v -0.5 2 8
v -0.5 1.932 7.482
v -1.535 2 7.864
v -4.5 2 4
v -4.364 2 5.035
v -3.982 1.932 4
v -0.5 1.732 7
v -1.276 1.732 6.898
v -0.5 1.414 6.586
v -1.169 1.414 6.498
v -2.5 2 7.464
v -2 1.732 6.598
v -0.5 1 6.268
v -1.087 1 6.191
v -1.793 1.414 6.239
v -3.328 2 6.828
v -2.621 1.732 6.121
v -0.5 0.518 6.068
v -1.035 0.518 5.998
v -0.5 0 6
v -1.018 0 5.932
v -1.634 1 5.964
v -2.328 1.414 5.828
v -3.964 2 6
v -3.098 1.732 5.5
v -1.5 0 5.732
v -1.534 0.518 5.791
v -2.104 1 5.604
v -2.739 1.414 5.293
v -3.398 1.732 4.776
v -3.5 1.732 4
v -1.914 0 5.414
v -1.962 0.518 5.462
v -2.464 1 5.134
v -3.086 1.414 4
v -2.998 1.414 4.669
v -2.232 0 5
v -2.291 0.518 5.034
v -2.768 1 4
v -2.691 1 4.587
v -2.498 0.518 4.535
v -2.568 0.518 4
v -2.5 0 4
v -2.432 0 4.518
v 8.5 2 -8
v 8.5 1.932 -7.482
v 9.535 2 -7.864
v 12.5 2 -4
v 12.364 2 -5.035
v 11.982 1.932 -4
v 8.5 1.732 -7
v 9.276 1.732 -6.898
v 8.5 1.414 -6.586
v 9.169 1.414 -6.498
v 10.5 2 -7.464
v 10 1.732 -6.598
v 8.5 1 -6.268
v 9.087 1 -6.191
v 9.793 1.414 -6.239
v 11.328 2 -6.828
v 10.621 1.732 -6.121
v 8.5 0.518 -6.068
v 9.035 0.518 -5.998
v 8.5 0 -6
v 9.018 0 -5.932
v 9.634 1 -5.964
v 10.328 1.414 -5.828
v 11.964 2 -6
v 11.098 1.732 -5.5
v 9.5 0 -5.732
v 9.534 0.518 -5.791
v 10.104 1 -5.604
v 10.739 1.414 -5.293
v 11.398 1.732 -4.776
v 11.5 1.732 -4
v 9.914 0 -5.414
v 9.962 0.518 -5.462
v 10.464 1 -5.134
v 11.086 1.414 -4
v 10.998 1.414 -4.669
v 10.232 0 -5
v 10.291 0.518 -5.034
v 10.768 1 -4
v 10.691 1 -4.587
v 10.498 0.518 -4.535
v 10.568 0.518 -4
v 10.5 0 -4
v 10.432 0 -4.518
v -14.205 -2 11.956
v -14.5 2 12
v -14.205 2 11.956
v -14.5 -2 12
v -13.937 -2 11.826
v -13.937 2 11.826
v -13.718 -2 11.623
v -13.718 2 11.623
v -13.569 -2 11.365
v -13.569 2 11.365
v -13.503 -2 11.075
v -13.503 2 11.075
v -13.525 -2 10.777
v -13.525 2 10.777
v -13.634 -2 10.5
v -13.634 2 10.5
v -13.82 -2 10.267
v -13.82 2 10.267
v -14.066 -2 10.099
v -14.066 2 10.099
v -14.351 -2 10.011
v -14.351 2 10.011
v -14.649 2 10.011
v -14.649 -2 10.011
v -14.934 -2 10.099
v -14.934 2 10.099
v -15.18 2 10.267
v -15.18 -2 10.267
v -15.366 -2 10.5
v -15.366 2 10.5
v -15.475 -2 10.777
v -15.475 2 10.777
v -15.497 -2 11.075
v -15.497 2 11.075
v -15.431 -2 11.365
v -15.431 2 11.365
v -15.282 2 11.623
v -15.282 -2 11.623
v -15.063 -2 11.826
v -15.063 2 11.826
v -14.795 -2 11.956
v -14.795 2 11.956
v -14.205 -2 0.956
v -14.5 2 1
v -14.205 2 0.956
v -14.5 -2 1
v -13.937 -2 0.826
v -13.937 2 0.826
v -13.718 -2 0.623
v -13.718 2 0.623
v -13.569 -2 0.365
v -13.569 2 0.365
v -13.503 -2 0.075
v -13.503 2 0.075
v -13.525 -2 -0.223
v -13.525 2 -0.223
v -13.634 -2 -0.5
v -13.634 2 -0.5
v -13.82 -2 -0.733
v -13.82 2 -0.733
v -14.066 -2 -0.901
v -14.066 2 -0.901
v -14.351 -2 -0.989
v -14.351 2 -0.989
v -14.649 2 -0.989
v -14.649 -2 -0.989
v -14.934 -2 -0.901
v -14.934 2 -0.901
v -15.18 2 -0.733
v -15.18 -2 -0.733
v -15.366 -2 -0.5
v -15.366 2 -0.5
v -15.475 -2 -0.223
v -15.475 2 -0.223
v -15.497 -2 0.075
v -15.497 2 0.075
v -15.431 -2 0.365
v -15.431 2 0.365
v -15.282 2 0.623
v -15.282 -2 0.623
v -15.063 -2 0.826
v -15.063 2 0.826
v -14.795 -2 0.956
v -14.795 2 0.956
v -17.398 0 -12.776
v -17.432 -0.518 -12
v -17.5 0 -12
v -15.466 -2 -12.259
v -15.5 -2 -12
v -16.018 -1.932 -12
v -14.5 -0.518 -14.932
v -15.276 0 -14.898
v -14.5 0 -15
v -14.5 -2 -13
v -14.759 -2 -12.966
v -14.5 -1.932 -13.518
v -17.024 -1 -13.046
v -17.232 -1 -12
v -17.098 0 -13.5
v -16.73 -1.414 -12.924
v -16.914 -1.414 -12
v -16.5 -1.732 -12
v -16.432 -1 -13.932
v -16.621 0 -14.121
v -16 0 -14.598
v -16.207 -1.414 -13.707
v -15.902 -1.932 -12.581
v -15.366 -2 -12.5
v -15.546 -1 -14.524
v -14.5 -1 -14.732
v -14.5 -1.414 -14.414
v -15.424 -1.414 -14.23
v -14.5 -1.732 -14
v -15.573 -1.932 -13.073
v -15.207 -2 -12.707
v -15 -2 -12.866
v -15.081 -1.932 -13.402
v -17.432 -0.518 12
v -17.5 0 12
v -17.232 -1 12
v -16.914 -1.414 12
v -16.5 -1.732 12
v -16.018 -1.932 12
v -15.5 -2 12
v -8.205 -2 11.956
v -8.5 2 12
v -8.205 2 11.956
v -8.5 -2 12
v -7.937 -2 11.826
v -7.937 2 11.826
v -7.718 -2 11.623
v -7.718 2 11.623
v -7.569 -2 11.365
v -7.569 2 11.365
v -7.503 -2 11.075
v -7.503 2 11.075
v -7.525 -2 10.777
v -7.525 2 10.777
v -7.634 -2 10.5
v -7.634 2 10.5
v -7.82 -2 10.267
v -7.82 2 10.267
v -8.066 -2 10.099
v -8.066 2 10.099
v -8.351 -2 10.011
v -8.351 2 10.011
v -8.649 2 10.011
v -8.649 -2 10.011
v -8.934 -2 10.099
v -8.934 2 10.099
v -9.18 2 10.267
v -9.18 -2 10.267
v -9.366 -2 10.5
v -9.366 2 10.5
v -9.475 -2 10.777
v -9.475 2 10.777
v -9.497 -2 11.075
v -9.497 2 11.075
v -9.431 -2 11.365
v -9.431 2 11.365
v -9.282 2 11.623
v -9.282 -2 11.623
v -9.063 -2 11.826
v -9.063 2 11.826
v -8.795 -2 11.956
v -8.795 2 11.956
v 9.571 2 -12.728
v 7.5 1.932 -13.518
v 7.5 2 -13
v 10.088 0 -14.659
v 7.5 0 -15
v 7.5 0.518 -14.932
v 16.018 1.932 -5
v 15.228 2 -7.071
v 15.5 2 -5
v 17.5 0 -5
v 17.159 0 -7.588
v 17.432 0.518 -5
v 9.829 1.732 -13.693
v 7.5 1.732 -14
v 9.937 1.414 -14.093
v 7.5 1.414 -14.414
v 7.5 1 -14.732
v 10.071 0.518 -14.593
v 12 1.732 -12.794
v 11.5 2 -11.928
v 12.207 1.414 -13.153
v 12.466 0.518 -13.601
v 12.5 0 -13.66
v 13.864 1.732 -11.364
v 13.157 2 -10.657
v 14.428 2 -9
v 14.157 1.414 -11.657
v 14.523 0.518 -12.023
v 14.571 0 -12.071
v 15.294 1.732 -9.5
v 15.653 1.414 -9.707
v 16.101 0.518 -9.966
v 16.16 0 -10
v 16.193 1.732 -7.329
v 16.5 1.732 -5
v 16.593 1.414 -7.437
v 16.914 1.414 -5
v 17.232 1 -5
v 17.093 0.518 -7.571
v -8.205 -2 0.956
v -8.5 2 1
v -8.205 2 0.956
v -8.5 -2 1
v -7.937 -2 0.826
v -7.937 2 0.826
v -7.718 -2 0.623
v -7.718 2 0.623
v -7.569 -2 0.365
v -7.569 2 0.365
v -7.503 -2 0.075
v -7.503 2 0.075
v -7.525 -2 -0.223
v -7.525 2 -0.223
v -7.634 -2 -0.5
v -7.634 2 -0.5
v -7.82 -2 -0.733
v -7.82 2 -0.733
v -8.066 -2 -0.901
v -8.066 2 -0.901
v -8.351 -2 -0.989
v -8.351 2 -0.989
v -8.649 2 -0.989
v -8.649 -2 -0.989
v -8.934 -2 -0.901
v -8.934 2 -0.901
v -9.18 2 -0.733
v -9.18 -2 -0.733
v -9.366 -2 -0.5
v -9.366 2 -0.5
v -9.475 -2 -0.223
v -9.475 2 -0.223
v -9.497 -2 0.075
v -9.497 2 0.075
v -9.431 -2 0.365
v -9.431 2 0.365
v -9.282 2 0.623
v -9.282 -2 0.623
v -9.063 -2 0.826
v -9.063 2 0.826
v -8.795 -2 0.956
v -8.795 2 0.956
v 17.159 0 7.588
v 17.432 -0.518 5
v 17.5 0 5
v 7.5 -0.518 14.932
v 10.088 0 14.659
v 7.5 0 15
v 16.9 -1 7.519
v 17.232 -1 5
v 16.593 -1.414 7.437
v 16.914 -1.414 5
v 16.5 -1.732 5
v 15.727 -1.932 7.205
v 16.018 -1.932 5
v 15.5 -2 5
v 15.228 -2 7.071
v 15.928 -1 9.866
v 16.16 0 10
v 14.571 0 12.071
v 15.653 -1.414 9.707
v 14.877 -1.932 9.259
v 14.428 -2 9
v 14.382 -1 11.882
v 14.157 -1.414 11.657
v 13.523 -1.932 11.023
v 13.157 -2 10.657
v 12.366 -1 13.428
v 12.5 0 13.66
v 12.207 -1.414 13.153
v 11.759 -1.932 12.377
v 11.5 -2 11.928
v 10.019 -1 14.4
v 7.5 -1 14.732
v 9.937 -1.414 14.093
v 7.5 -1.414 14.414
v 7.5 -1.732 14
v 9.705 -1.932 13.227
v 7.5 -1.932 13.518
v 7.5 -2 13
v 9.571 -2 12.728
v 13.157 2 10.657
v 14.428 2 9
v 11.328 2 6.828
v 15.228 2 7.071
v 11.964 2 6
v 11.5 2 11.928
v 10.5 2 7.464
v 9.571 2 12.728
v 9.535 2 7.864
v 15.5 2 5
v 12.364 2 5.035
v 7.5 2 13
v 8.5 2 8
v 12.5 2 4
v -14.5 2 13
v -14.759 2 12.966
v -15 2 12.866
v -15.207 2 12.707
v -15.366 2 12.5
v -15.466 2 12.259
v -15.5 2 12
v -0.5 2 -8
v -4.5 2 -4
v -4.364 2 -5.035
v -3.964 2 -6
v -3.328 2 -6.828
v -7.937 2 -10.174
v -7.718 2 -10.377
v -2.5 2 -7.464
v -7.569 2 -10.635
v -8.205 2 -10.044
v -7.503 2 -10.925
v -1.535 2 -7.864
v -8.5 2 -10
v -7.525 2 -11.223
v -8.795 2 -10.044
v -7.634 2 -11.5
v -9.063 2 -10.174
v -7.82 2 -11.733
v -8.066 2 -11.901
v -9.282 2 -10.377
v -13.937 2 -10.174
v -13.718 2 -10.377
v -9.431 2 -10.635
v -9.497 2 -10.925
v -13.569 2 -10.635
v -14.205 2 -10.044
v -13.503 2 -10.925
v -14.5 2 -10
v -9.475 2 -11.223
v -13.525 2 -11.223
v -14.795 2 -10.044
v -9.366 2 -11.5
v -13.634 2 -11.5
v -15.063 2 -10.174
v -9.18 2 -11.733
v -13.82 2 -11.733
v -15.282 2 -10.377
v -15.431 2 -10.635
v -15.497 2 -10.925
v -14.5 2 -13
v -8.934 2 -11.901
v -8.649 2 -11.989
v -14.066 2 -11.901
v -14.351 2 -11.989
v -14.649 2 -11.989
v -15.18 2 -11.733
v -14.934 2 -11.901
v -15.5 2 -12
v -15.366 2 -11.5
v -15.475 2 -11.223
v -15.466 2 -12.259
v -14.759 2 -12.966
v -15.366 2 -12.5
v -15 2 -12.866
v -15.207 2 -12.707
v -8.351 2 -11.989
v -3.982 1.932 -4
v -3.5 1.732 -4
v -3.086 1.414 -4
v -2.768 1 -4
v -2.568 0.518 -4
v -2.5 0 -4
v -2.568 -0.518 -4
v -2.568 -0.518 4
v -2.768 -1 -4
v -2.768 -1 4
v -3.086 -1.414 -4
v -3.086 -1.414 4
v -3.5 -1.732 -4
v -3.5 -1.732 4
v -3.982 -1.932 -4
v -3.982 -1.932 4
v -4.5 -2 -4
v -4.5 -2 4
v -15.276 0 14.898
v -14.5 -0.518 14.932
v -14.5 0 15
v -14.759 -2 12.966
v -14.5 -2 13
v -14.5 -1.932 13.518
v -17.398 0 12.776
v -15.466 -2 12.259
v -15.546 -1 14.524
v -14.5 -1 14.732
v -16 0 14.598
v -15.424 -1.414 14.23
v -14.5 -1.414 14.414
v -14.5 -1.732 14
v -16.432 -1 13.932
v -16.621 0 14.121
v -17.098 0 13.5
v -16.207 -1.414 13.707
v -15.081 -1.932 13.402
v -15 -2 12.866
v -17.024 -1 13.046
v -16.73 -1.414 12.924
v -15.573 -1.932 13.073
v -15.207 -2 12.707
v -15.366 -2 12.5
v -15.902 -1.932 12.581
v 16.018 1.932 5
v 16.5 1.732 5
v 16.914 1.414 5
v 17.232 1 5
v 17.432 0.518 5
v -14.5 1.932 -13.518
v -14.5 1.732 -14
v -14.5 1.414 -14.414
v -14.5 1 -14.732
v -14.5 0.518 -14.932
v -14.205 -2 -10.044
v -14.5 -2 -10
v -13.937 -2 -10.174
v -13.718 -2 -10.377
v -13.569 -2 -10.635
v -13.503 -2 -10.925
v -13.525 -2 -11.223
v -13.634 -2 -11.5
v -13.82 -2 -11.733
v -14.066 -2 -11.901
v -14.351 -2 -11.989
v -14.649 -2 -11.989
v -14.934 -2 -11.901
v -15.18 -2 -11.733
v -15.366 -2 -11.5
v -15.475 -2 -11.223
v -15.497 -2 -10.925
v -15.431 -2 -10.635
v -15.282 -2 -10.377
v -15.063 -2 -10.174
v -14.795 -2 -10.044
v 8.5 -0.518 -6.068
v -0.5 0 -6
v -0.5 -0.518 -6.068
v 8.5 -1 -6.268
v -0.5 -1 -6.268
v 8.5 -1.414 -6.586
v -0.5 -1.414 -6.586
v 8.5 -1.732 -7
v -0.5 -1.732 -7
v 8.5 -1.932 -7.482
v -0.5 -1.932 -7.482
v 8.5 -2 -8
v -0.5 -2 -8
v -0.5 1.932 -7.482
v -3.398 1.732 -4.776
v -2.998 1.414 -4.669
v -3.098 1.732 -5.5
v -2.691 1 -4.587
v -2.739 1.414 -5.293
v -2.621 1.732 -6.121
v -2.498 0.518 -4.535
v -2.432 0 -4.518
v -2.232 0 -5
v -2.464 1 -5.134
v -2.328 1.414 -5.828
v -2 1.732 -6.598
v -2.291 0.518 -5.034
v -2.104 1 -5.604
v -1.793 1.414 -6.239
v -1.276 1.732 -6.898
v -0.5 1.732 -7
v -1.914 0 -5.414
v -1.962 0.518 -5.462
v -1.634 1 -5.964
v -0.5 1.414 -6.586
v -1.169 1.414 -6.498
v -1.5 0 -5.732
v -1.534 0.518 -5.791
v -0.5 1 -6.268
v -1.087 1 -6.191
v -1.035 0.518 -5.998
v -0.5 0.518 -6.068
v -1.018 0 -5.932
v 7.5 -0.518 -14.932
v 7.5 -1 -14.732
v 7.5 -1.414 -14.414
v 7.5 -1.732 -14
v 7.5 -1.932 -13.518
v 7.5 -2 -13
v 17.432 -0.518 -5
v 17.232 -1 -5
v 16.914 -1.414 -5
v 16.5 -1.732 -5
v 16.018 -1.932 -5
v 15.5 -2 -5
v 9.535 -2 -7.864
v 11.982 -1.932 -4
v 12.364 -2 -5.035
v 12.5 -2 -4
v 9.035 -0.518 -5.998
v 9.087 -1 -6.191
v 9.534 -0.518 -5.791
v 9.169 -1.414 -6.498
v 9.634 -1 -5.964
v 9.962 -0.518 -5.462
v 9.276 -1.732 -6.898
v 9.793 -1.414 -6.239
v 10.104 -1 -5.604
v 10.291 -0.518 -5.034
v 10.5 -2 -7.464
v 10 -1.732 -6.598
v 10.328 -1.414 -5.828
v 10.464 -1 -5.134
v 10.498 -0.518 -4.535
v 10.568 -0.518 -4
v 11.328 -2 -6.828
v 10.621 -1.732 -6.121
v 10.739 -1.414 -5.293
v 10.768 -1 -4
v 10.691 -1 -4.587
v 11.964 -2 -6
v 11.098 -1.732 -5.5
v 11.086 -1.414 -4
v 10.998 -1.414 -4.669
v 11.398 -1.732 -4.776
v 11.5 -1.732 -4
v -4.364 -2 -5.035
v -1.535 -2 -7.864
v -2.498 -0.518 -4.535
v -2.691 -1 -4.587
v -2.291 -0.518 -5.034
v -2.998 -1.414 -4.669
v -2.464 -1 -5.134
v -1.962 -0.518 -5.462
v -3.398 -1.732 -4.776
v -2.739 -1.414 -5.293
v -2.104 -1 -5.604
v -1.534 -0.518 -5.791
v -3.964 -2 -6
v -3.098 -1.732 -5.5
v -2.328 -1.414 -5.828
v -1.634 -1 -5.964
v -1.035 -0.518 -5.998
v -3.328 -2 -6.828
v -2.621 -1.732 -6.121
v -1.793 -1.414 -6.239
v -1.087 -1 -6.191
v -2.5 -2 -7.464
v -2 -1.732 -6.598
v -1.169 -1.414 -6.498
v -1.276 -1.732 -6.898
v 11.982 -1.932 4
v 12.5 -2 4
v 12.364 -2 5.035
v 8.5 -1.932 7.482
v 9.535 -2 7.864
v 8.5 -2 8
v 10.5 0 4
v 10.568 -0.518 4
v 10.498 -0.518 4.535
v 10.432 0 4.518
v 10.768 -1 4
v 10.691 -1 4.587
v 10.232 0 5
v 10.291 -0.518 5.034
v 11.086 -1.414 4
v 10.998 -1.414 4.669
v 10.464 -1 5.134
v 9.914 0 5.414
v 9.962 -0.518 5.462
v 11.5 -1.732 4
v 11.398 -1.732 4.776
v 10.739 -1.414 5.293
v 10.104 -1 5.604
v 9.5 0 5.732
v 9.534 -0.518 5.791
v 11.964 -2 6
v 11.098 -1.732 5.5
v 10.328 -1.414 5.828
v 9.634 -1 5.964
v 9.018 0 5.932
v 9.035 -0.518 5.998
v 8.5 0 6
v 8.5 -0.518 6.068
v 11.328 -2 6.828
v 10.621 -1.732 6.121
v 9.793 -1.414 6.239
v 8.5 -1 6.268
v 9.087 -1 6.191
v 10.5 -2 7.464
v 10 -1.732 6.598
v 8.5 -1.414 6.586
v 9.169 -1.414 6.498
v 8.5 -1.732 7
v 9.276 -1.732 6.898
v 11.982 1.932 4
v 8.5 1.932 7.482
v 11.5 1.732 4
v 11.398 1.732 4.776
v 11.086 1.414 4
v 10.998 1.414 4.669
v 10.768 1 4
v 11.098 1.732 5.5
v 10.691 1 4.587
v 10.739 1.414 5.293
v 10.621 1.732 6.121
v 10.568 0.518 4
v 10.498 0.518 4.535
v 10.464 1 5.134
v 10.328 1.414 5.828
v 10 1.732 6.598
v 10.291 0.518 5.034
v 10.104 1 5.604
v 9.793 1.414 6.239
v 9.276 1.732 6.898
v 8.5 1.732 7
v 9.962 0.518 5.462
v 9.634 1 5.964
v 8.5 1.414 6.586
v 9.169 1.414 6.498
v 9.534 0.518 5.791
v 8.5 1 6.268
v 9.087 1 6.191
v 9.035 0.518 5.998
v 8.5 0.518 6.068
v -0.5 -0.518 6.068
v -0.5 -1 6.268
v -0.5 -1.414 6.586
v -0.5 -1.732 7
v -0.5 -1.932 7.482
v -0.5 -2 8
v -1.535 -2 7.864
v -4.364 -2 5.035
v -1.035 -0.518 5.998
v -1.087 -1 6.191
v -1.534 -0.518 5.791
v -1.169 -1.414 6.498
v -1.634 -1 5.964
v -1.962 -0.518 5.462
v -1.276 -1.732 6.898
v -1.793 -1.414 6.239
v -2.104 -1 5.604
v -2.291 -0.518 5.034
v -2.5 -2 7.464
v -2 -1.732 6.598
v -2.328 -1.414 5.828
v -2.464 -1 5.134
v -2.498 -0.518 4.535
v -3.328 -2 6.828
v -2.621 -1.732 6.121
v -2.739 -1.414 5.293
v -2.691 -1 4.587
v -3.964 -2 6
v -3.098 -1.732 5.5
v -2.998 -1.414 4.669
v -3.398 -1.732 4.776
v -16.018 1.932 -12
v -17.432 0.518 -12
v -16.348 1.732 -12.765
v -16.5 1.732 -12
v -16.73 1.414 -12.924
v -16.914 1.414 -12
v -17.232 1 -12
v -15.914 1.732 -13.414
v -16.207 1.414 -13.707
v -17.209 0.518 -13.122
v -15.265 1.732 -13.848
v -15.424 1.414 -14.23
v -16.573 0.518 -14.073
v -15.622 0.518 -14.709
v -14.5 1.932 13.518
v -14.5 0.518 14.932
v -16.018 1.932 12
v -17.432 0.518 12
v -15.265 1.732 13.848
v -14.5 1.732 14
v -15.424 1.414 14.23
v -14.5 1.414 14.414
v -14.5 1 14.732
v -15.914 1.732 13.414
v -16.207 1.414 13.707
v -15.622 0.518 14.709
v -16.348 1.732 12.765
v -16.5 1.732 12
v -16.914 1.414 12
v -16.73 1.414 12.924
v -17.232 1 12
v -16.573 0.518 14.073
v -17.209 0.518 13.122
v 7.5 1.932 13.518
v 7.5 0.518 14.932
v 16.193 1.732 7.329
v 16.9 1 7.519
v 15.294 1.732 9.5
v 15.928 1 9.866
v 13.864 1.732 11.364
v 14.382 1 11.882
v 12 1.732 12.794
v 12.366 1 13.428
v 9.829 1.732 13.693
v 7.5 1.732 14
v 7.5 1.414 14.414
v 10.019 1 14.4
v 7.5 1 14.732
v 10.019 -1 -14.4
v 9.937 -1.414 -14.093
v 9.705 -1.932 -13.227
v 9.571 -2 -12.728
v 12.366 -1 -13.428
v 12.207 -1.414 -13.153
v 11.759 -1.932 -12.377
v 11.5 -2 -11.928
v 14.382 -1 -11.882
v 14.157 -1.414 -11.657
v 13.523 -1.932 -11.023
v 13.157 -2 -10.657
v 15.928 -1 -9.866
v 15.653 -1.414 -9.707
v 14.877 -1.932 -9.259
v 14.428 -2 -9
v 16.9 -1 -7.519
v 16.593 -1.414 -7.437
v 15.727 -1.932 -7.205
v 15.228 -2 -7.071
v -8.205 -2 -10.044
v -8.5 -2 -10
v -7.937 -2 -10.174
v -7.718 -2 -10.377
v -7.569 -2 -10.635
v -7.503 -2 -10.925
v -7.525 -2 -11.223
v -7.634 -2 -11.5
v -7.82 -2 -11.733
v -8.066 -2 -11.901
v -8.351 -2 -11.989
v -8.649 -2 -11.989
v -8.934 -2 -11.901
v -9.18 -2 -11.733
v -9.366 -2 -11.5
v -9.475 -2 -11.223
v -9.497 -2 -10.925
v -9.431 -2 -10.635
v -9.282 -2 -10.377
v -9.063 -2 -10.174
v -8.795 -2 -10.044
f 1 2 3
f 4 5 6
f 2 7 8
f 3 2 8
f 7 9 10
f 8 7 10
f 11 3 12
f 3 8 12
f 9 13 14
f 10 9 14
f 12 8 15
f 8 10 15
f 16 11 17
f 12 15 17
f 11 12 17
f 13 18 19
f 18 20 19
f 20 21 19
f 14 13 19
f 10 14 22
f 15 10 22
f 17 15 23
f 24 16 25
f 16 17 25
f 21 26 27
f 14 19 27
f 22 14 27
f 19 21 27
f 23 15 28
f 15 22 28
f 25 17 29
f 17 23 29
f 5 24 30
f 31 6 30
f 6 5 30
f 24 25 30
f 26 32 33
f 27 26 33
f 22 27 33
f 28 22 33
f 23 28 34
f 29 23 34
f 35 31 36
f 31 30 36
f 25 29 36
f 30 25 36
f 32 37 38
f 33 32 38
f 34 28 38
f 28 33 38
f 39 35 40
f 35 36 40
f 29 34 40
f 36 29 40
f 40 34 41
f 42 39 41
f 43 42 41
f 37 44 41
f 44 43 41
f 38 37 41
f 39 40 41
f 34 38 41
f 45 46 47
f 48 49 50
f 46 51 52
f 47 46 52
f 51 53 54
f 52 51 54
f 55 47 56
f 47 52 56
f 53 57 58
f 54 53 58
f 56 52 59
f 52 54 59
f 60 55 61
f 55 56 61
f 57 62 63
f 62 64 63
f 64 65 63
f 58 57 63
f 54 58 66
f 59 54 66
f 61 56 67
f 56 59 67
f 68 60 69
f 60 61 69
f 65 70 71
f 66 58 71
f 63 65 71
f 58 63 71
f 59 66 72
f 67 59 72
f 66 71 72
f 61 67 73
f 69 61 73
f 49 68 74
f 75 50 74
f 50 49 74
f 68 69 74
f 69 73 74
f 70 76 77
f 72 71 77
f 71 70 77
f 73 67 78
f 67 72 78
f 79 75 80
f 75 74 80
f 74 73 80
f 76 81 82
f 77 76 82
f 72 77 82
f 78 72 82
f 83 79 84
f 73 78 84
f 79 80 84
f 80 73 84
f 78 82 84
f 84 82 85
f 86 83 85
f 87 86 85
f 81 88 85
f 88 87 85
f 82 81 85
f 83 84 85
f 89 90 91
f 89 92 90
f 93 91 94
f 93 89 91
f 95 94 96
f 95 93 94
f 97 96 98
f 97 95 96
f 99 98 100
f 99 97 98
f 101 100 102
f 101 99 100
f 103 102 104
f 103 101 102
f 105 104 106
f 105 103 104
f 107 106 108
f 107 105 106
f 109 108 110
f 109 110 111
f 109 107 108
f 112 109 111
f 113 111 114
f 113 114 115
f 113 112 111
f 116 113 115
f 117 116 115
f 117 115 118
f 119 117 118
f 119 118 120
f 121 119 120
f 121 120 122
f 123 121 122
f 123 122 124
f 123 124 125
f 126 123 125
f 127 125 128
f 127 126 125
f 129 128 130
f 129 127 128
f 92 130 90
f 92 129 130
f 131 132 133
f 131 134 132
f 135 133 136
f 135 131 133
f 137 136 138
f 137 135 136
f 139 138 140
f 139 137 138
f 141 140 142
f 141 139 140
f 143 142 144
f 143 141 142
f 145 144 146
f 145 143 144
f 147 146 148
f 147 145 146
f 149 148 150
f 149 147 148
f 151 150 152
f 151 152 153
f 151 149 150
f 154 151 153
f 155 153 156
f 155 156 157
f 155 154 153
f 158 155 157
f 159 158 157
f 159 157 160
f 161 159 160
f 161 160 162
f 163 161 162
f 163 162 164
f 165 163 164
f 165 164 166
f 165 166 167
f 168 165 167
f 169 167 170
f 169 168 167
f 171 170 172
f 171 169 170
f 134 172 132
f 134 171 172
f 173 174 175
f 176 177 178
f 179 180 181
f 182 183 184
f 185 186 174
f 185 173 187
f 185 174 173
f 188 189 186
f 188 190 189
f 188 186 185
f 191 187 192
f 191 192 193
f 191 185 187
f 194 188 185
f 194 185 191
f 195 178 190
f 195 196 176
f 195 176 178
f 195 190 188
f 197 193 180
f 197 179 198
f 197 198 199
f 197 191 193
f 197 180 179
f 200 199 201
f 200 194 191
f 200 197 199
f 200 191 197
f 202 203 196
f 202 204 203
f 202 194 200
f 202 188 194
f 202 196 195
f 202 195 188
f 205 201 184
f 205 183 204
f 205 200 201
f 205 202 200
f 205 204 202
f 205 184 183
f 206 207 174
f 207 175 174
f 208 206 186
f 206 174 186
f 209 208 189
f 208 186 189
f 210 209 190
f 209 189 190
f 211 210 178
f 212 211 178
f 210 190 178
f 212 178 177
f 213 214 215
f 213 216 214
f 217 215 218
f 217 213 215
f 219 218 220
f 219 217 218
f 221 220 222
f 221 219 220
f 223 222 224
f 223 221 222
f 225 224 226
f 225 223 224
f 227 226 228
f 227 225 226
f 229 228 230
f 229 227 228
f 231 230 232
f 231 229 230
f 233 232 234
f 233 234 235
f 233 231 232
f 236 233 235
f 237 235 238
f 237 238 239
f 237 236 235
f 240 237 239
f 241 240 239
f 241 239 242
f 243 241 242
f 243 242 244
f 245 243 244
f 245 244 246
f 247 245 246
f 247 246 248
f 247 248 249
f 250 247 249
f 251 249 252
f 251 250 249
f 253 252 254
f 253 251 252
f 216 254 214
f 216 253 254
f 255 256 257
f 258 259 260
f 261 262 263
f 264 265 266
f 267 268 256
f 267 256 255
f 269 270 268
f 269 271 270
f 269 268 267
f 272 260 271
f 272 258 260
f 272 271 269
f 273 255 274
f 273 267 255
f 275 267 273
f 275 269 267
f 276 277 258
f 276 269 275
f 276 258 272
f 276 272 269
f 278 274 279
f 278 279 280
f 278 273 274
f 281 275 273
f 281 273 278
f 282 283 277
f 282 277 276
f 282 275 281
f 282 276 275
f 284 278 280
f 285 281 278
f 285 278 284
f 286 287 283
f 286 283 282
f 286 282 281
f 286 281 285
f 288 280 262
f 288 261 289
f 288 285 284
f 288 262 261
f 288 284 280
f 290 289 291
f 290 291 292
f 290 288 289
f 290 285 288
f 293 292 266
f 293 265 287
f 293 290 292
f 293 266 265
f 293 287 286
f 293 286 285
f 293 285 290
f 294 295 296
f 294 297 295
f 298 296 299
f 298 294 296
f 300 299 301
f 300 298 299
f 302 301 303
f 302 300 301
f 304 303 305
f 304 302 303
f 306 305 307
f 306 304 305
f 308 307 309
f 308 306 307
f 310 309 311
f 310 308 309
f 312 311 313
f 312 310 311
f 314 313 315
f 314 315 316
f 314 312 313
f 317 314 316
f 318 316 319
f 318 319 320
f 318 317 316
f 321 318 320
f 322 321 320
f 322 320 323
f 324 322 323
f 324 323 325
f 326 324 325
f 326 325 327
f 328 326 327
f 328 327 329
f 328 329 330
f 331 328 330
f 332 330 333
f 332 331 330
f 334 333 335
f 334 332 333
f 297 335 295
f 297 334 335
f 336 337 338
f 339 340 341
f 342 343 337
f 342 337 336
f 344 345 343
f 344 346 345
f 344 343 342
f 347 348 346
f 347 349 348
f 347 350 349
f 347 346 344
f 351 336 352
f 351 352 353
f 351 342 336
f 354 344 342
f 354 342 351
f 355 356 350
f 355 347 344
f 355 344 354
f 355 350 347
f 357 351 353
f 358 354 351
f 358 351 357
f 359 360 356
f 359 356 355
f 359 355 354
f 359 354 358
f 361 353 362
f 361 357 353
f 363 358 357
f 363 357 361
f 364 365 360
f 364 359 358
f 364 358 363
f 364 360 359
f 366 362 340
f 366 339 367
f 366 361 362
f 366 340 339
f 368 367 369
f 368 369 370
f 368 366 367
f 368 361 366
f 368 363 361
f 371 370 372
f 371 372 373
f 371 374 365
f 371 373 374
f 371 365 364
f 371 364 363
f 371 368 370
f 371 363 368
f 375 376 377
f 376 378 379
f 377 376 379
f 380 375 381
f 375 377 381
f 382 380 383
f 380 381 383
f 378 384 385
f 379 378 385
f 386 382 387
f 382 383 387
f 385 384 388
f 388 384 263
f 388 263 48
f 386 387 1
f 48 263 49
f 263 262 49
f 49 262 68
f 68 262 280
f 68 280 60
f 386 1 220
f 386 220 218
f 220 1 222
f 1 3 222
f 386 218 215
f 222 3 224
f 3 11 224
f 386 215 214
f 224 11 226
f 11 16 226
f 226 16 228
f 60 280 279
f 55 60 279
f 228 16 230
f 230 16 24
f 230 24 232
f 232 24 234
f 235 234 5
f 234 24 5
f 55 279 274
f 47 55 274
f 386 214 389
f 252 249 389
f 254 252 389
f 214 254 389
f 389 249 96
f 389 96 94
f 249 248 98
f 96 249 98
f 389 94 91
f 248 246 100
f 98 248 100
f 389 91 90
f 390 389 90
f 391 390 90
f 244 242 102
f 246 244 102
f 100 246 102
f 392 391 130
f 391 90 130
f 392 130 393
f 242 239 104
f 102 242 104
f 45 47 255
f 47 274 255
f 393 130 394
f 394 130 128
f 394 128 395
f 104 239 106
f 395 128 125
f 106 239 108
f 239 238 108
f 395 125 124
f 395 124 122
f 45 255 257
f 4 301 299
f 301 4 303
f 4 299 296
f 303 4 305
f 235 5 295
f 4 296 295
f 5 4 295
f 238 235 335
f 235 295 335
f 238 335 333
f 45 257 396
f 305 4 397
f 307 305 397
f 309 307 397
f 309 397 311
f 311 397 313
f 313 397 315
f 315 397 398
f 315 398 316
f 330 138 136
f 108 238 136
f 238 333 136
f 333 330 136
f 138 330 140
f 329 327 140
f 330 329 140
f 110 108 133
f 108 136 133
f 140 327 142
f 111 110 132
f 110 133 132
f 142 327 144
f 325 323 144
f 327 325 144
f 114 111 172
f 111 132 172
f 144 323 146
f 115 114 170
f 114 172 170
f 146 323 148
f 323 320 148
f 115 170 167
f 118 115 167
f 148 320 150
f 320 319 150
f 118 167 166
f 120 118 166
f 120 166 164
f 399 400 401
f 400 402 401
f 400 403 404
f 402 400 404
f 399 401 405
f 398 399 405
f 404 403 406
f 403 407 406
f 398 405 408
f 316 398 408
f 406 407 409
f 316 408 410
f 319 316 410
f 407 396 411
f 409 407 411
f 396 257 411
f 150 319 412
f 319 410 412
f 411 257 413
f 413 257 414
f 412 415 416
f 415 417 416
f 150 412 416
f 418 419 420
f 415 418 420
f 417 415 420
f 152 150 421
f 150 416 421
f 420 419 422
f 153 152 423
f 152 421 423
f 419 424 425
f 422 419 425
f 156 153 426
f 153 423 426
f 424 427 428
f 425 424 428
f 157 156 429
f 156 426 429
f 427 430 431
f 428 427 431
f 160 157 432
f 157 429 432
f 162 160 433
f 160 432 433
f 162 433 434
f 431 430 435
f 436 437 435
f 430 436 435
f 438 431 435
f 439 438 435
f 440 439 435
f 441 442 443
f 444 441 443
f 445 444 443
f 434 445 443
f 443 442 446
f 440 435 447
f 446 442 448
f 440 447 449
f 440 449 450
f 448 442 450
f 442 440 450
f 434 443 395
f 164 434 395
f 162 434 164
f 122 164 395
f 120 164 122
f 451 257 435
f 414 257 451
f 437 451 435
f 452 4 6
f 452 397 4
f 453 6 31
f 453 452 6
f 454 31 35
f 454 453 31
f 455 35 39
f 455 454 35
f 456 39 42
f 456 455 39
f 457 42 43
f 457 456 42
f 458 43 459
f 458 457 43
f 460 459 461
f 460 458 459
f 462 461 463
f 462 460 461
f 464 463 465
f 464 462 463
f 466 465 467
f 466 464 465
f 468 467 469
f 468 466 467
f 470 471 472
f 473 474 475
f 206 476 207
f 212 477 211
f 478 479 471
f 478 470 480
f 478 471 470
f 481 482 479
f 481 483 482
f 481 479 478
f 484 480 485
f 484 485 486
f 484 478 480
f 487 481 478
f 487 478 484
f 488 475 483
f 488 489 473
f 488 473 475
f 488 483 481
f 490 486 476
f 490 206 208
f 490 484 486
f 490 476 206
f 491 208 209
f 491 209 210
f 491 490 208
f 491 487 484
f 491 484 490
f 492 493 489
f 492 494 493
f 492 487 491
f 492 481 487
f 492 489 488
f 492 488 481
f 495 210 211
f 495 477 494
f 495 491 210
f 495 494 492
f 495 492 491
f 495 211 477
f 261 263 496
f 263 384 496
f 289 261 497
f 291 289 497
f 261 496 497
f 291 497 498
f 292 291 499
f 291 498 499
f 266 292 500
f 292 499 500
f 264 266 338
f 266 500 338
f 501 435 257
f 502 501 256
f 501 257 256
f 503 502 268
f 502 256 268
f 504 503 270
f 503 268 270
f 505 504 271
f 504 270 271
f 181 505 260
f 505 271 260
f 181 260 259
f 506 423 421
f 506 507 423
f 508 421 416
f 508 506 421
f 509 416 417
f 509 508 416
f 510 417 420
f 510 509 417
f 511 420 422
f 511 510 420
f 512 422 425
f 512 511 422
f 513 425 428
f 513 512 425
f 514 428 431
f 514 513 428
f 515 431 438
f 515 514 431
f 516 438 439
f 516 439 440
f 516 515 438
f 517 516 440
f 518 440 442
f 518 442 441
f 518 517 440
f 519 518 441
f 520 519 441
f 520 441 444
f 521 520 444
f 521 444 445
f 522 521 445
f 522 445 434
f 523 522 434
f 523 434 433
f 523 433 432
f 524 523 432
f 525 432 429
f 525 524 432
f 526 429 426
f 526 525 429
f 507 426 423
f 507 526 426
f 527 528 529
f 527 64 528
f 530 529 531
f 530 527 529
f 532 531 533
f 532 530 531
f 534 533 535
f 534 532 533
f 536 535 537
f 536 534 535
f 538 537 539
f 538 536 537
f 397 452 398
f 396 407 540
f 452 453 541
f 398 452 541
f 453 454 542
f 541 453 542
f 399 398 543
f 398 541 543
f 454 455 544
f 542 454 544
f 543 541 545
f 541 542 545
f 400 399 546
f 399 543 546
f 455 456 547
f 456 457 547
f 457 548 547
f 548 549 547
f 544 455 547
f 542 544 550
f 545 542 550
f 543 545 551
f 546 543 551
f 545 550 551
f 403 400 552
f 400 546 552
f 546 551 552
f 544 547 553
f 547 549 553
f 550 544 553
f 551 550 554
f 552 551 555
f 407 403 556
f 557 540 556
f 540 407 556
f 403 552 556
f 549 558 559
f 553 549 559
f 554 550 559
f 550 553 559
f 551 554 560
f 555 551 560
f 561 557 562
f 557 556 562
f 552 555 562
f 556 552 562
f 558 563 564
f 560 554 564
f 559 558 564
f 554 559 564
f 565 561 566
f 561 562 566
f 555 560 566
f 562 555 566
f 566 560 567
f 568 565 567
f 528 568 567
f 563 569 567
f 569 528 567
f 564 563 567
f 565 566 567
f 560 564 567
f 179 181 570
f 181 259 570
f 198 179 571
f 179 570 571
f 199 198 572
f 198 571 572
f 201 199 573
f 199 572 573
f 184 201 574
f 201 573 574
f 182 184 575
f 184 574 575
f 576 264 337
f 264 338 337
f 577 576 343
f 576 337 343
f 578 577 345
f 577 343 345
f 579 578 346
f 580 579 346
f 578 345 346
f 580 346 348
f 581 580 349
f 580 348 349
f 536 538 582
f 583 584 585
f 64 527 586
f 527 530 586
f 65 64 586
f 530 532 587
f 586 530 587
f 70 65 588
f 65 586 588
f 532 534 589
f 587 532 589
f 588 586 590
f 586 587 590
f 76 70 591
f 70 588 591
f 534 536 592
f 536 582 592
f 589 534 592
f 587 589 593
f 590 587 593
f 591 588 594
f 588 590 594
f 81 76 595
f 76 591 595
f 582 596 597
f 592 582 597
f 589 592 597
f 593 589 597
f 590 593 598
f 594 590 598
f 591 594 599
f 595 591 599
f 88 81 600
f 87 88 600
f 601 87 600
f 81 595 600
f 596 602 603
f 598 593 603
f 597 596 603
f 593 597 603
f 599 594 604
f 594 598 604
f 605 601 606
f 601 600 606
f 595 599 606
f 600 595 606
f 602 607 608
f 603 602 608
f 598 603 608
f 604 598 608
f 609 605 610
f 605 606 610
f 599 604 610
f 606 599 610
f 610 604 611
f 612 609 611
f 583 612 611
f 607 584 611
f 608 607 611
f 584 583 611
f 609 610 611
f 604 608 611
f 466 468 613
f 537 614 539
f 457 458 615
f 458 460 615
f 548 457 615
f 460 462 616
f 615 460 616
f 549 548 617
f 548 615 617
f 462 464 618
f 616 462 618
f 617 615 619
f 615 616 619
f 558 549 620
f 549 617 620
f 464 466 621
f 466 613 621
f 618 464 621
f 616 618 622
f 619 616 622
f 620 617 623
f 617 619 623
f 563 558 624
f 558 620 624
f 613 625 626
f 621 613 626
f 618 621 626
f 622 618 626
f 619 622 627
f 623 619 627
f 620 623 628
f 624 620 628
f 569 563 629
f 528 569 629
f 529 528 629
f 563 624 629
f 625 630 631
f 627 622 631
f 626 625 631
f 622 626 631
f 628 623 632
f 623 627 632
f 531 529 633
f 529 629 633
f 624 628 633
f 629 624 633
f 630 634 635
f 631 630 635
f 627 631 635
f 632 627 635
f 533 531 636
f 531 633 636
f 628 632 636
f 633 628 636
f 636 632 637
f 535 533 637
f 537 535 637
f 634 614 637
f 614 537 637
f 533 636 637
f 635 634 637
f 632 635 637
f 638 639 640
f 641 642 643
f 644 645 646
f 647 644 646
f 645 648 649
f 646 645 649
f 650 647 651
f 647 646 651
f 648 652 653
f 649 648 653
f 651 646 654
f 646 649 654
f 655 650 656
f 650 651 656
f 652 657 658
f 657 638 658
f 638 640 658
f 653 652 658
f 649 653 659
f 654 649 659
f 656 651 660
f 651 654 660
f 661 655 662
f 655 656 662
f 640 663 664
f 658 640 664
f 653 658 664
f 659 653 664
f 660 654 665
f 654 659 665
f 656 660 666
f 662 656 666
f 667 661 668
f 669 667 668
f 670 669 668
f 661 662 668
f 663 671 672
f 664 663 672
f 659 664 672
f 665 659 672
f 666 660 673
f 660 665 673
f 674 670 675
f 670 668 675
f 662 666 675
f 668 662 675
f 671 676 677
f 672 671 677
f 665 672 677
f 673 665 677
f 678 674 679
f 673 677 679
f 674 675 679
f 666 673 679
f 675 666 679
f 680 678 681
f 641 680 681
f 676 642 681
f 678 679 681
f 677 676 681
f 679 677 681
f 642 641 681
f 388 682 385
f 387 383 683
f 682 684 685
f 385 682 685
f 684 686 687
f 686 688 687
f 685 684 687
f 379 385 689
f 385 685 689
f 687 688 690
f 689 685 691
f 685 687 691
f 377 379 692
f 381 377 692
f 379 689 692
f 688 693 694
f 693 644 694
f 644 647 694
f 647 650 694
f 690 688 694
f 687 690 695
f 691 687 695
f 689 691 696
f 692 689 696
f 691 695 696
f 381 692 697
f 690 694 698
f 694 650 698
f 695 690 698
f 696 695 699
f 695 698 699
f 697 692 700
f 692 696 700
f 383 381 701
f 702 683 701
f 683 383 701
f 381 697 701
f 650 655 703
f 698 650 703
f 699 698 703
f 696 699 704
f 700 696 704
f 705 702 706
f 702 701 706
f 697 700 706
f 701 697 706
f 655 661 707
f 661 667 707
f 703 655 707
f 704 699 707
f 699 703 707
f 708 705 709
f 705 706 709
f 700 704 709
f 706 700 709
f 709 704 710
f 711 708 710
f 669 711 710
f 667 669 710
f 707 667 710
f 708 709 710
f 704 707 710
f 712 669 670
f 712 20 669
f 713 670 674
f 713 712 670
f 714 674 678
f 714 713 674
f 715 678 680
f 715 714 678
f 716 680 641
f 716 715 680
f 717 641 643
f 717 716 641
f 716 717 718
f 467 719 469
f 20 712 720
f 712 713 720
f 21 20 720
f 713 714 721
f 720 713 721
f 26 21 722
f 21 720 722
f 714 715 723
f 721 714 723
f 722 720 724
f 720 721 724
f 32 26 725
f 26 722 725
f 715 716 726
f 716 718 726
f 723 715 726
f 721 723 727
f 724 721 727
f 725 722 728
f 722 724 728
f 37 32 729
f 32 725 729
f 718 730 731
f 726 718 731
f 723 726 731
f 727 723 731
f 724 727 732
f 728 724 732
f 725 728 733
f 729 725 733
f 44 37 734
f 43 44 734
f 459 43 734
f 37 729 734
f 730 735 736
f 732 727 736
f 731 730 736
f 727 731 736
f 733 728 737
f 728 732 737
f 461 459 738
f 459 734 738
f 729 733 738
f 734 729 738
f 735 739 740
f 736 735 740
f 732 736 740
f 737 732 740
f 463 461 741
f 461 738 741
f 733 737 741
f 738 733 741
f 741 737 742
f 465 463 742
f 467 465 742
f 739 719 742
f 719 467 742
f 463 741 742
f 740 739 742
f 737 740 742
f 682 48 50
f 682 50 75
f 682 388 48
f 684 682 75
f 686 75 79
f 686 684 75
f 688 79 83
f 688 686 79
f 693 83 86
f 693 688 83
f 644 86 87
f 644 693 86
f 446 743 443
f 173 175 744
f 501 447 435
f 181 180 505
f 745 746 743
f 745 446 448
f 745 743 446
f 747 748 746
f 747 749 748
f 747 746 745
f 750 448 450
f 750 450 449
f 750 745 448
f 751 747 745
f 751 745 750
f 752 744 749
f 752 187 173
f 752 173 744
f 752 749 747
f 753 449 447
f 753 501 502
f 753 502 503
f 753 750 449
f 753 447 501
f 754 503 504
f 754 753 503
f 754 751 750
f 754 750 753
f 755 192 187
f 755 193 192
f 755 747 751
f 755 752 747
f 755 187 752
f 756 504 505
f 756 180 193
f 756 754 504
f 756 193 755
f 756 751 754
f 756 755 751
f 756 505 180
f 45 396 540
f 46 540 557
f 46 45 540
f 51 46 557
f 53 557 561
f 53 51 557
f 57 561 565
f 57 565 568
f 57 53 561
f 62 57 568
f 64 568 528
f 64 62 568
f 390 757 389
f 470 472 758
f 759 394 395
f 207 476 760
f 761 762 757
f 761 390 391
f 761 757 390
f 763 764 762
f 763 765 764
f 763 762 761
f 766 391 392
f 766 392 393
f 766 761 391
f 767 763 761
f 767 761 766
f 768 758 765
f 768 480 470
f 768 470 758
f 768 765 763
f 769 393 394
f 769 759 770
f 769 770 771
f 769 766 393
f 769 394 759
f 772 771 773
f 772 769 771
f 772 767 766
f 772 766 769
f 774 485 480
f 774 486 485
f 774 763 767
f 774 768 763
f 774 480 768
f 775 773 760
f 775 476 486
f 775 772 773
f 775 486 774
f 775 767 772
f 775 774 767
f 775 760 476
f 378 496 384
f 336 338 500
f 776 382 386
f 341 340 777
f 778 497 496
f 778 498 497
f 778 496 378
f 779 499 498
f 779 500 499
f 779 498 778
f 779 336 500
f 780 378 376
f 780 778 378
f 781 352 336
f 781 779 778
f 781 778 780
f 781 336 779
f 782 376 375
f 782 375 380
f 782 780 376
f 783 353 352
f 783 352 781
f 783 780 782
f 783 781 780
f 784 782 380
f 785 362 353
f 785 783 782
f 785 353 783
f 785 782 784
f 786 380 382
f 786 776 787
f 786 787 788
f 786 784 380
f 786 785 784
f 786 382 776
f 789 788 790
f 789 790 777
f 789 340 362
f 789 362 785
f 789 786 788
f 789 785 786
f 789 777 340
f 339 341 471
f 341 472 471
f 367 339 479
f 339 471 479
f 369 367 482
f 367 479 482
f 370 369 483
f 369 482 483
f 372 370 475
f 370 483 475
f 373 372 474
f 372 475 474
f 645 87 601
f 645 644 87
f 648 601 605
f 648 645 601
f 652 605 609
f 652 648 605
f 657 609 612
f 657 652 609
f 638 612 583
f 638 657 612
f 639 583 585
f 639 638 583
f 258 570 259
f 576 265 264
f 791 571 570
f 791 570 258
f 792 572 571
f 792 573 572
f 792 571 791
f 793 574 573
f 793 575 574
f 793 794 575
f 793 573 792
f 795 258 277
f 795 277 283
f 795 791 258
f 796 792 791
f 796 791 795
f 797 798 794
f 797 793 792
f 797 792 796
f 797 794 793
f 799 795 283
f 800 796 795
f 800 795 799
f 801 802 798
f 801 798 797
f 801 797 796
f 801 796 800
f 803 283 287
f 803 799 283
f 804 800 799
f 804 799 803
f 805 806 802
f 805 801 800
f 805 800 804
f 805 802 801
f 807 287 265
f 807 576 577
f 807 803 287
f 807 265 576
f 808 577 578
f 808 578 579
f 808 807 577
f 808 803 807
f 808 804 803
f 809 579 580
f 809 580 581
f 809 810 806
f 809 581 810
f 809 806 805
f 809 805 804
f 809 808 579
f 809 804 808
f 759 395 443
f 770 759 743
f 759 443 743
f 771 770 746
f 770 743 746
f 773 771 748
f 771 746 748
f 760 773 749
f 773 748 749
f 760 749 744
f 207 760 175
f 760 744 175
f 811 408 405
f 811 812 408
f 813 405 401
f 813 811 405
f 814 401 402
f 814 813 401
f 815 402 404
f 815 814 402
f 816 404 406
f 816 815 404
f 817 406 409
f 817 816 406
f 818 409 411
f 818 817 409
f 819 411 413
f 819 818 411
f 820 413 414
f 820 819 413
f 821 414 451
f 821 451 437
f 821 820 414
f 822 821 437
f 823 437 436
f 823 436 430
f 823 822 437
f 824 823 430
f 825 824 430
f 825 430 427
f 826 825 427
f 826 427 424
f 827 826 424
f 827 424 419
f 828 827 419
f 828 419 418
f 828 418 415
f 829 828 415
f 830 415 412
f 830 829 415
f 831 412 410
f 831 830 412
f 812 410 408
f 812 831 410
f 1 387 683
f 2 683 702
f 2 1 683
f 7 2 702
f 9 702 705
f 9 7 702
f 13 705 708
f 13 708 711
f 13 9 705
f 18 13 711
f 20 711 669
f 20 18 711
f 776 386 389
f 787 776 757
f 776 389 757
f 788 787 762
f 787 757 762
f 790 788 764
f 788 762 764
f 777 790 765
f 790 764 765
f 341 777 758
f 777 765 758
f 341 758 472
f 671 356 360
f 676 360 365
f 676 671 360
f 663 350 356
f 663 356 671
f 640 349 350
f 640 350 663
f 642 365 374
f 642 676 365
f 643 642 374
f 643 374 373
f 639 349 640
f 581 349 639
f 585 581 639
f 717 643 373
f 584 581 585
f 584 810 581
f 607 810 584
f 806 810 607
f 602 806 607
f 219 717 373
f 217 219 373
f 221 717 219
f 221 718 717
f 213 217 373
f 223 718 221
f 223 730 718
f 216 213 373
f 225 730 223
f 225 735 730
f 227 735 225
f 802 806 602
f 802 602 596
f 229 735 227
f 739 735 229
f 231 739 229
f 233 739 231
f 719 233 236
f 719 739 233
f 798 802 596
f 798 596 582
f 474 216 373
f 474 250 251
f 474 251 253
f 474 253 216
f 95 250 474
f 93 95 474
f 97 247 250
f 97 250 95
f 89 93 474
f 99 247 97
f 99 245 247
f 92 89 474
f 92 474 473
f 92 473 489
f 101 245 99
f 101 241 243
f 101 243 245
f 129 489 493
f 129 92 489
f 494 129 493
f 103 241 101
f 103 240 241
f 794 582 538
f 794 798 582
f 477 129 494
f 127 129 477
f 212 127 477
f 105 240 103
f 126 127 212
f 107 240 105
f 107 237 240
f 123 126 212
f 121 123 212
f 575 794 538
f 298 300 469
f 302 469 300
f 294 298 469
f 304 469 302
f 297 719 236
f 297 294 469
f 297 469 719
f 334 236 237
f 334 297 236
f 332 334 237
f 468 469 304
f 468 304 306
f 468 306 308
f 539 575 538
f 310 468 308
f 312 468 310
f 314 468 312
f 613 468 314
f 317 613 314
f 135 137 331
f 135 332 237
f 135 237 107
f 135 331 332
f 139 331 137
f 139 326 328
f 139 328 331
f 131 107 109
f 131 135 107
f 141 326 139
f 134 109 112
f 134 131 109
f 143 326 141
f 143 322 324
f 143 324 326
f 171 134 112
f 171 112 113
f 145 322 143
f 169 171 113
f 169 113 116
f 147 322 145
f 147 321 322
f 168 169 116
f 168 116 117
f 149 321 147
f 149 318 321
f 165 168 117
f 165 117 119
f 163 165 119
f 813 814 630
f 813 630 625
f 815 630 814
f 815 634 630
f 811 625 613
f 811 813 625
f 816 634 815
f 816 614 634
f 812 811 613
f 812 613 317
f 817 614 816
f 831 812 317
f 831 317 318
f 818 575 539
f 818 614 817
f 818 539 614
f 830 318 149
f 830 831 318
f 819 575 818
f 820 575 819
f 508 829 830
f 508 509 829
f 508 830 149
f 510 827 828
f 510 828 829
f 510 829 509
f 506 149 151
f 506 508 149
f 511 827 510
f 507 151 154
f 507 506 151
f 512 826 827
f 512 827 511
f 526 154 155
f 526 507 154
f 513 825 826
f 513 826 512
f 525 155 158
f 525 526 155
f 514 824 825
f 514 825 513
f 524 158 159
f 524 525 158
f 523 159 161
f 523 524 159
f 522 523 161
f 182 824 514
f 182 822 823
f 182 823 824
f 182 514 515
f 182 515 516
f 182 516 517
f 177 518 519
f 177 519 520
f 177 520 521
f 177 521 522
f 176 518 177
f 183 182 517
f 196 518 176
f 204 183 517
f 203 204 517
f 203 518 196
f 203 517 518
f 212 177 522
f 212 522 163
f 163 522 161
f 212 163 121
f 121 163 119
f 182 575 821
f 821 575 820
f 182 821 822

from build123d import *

# Parameters (mm, degrees)
SKETCH1_R           = 1
BOSS_EXTRUDE1_DEPTH = 2
FILLET1_R           = 2


with BuildPart() as part:
    # Sketch1 → Boss-Extrude1 (new, symmetric)
    with BuildSketch(Plane(origin=(0, 0, 0), x_dir=(1, 0, 0), z_dir=(0, 1, 0))):
        with BuildLine():
            Line((-14.5, 15), (7.5, 15))
            ThreePointArc((7.5, 15), (14.571067812, 12.071067812), (17.5, 5))
            Line((17.5, 5), (17.5, -5))
            ThreePointArc((17.5, -5), (14.571067812, -12.071067812), (7.5, -15))
            Line((7.5, -15), (-14.5, -15))
            ThreePointArc((-14.5, -15), (-16.621320344, -14.121320344), (-17.5, -12))
            Line((-17.5, -12), (-17.5, 12))
            ThreePointArc((-17.5, 12), (-16.621320344, 14.121320344), (-14.5, 15))
        make_face()
        with Locations(Location((-8.5, 11, 0), (0, 0, 270))):
            Circle(SKETCH1_R, mode=Mode.SUBTRACT)
        with Locations(Location((-14.5, 11, 0), (0, 0, 270))):
            Circle(SKETCH1_R, mode=Mode.SUBTRACT)
        with Locations(Location((-14.5, -11, 0), (0, 0, 270))):
            Circle(SKETCH1_R, mode=Mode.SUBTRACT)
        with Locations(Location((-8.5, -11, 0), (0, 0, 270))):
            Circle(SKETCH1_R, mode=Mode.SUBTRACT)
        with Locations(Location((-8.5, 0, 0), (0, 0, 270))):
            Circle(SKETCH1_R, mode=Mode.SUBTRACT)
        with Locations(Location((-14.5, 0, 0), (0, 0, 270))):
            Circle(SKETCH1_R, mode=Mode.SUBTRACT)
        with BuildLine():
            Line((-0.5, 6), (8.5, 6))
            ThreePointArc((8.5, 6), (9.914213562, 5.414213562), (10.5, 4))
            Line((10.5, 4), (10.5, -4))
            ThreePointArc((10.5, -4), (9.914213562, -5.414213562), (8.5, -6))
            Line((8.5, -6), (-0.5, -6))
            ThreePointArc((-0.5, -6), (-1.914213562, -5.414213562), (-2.5, -4))
            Line((-2.5, -4), (-2.5, 4))
            ThreePointArc((-2.5, 4), (-1.914213562, 5.414213562), (-0.5, 6))
        make_face(mode=Mode.SUBTRACT)
    extrude(amount=BOSS_EXTRUDE1_DEPTH, both=True)

    # Fillet1
    fillet1_edges = [part.edges().sort_by_distance(p)[0] for p in [
        (14.571067812, -2, 12.071067812),
        (-3.5, -2, 15),
        (-16.621320344, -2, 14.121320344),
        (-17.5, -2, 0),
        (-16.621320344, -2, -14.121320344),
        (-3.5, -2, -15),
        (14.571067812, -2, -12.071067812),
        (14.571067812, 2, 12.071067812),
        (-3.5, 2, 15),
        (-16.621320344, 2, 14.121320344),
        (-17.5, 2, 0),
        (-16.621320344, 2, -14.121320344),
        (-3.5, 2, -15),
        (14.571067812, 2, -12.071067812),
        (9.914213562, -2, 5.414213562),
        (4, -2, 6),
        (-1.914213562, -2, 5.414213562),
        (-2.5, -2, 0),
        (-1.914213562, -2, -5.414213562),
        (4, -2, -6),
        (9.914213562, -2, -5.414213562),
        (-1.914213562, 2, -5.414213562),
        (4, 2, -6),
        (9.914213562, 2, -5.414213562),
        (10.5, 2, 0),
        (9.914213562, 2, 5.414213562),
        (4, 2, 6),
        (-1.914213562, 2, 5.414213562),
        (17.5, -2, 0),
        (17.5, 2, 0),
        (10.5, -2, 0),
        (-2.5, 2, 0),
    ]]
    fillet(fillet1_edges, radius=FILLET1_R - 0.0001)  # a hair under: the kernel refuses the full size


solid = part.part
